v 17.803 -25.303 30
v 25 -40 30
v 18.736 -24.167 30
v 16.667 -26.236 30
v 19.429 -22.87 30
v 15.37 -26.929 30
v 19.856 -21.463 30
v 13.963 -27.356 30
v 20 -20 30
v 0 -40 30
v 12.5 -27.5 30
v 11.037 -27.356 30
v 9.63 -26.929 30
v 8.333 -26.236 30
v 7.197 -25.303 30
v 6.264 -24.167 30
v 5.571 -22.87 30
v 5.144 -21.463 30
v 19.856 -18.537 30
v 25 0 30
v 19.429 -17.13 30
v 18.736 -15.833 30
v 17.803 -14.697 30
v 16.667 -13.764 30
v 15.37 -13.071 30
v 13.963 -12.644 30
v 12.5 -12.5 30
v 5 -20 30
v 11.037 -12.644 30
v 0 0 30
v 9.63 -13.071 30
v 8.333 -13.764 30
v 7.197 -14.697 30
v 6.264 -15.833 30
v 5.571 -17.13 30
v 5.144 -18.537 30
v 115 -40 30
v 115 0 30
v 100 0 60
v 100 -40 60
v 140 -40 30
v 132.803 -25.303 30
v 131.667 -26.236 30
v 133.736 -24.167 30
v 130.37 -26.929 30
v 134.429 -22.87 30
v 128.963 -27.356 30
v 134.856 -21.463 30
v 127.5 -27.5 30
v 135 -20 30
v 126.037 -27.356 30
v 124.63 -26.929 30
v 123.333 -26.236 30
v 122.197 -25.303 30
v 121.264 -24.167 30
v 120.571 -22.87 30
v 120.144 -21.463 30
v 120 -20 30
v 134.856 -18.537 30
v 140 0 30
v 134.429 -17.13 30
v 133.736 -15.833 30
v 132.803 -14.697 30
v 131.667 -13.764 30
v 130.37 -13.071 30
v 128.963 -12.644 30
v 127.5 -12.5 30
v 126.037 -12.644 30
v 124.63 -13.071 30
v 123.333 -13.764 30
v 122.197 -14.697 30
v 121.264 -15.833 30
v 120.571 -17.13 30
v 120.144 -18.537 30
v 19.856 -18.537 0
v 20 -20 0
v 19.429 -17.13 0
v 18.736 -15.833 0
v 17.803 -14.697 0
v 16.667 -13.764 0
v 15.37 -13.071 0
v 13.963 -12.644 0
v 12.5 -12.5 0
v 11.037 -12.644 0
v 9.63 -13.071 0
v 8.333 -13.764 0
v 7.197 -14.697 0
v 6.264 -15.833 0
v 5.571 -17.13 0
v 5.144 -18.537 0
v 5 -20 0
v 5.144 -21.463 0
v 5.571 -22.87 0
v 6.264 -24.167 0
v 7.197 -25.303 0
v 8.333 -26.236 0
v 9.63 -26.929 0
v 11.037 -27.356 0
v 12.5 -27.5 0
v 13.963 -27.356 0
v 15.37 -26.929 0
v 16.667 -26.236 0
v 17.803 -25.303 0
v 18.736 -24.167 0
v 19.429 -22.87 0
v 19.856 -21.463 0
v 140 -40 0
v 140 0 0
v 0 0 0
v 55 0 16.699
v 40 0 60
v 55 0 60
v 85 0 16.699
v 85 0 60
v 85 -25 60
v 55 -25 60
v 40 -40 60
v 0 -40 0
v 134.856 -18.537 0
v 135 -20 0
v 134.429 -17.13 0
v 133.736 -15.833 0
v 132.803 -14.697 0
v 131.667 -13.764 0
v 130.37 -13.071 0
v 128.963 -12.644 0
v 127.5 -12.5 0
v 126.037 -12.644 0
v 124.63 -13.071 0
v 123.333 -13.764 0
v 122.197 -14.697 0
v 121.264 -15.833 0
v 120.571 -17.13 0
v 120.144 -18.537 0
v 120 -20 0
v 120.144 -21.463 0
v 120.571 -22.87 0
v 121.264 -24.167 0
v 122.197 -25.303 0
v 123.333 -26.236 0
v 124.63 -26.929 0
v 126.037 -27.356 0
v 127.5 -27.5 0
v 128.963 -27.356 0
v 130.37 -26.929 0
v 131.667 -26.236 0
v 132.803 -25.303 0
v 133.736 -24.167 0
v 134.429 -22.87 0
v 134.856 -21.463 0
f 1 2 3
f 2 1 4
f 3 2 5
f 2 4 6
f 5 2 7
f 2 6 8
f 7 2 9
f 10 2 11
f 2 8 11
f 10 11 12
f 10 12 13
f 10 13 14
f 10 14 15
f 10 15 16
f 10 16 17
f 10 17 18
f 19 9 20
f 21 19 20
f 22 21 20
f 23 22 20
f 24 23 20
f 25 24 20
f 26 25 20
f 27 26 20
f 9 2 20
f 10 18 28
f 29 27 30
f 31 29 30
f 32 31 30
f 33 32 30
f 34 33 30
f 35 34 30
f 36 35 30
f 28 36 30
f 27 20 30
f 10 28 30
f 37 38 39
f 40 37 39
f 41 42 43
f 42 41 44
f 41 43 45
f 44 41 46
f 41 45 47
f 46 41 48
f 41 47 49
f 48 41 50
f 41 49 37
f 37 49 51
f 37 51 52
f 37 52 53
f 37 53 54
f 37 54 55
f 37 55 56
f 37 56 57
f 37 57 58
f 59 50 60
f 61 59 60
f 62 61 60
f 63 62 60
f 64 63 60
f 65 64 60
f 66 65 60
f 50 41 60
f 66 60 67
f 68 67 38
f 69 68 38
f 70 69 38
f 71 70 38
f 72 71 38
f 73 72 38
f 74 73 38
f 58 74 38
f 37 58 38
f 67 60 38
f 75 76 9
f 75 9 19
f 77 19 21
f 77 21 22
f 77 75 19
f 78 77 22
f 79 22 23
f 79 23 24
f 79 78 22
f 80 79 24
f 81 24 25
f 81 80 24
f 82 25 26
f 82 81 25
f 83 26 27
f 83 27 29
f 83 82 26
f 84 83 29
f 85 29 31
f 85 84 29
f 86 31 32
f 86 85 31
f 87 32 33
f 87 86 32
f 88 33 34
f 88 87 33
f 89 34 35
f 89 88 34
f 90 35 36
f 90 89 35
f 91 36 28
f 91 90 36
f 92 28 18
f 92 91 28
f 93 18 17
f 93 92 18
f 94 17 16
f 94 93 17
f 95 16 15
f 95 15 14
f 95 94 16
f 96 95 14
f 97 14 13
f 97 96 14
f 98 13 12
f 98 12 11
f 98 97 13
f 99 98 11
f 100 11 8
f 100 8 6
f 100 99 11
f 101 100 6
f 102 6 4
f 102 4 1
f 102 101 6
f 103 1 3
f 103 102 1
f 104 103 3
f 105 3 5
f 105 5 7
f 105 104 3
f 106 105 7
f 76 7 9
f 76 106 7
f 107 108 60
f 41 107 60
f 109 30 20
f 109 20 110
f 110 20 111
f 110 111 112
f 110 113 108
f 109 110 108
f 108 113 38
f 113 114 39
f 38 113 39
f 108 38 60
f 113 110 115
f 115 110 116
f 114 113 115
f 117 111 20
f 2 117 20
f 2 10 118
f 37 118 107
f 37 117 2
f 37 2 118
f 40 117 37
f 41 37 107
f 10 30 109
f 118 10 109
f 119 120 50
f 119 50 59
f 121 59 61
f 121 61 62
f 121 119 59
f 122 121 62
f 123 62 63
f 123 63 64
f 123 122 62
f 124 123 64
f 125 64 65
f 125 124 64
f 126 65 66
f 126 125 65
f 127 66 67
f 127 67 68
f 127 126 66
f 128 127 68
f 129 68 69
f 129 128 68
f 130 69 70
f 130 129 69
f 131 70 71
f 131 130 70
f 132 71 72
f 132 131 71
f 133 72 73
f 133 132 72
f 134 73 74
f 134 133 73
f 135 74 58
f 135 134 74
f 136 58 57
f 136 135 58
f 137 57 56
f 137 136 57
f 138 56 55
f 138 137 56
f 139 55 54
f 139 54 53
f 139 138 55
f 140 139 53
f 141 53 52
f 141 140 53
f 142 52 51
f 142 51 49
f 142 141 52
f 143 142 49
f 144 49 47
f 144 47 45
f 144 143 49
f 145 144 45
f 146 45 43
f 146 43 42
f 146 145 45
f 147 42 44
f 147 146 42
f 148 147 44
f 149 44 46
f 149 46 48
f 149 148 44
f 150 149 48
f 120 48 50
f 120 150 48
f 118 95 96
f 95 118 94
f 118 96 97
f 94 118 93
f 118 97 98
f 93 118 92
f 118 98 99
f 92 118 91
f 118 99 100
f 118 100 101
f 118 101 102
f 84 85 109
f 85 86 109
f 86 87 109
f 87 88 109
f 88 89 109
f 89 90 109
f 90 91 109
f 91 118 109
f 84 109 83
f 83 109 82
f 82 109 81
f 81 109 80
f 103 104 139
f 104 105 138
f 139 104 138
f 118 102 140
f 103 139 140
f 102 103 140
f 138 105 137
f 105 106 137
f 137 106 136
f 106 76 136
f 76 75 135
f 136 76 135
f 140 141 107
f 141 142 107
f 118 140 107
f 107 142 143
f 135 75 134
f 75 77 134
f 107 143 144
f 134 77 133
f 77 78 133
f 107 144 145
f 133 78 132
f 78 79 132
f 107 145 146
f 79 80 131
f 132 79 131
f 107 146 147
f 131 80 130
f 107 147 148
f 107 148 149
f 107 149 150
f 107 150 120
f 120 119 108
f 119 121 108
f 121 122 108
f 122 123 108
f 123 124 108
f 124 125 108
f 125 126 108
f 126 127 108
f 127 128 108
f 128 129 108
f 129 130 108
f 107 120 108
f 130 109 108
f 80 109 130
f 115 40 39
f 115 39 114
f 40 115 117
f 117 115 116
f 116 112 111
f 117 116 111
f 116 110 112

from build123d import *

# Parameters (mm, degrees)
F1_DEPTH    = 40
F2_W        = 30
F2_H        = 45
F3_DEPTH    = 25
F4_T4_DEPTH = 30
F5_R        = 7.5
F6_DEPTH    = 30


# Not quite as in the source:
# - a fillet or chamfer that OpenCascade refuses, or shapes differently, is made with other operations: its cross-section is extruded or revolved along the edge and cut away or added


with BuildPart() as f1:
    # F0 (on Front) → F1 (new body)
    with BuildSketch(Plane.XZ):
        Polygon((0, 30), (0, 0), (140, 0), (140, 30), (115, 30), (100, 60), (85, 60), (55, 60), (40, 60), (25, 30), align=None)
    extrude(amount=F1_DEPTH)

    # F2 (on Front) → F3 (cut)
    with BuildSketch(Plane.XZ):
        with Locations((70, 37.5)):
            Rectangle(F2_W, F2_H)
    extrude(amount=F3_DEPTH, mode=Mode.SUBTRACT)

    # F4: chamfer of 45 x 25.9807621135 on 1 edges, made by hand


with BuildPart() as f4_tool2:
    # F4_s3 → F4_t4 (new body)
    with BuildSketch(Plane.YZ.offset(55)):
        Polygon((0.9807621135, 15), (-25, 60), (-25, 15), align=None)
    extrude(amount=F4_T4_DEPTH)

    split(bisect_by=Plane.XZ, keep=Keep.TOP)

    split(bisect_by=Plane.XY.offset(60), keep=Keep.BOTTOM)


with BuildPart() as f1_1:
    add(f1.part)

    # F4_t1: union F4_tool2
    add(f4_tool2.part)

    # F5 (on Top) → F6 (cut)
    with BuildSketch(Plane.XY):
        with Locations((127.5, -20)):
            Circle(F5_R)
        with BuildLine():
            ThreePointArc((12.5, -12.5), (7.1966991411, -25.3033008589), (20, -20))
            ThreePointArc((20, -20), (17.8033008589, -14.6966991411), (12.5, -12.5))
        make_face()
    extrude(amount=F6_DEPTH, mode=Mode.SUBTRACT)


solid = f1_1.part
